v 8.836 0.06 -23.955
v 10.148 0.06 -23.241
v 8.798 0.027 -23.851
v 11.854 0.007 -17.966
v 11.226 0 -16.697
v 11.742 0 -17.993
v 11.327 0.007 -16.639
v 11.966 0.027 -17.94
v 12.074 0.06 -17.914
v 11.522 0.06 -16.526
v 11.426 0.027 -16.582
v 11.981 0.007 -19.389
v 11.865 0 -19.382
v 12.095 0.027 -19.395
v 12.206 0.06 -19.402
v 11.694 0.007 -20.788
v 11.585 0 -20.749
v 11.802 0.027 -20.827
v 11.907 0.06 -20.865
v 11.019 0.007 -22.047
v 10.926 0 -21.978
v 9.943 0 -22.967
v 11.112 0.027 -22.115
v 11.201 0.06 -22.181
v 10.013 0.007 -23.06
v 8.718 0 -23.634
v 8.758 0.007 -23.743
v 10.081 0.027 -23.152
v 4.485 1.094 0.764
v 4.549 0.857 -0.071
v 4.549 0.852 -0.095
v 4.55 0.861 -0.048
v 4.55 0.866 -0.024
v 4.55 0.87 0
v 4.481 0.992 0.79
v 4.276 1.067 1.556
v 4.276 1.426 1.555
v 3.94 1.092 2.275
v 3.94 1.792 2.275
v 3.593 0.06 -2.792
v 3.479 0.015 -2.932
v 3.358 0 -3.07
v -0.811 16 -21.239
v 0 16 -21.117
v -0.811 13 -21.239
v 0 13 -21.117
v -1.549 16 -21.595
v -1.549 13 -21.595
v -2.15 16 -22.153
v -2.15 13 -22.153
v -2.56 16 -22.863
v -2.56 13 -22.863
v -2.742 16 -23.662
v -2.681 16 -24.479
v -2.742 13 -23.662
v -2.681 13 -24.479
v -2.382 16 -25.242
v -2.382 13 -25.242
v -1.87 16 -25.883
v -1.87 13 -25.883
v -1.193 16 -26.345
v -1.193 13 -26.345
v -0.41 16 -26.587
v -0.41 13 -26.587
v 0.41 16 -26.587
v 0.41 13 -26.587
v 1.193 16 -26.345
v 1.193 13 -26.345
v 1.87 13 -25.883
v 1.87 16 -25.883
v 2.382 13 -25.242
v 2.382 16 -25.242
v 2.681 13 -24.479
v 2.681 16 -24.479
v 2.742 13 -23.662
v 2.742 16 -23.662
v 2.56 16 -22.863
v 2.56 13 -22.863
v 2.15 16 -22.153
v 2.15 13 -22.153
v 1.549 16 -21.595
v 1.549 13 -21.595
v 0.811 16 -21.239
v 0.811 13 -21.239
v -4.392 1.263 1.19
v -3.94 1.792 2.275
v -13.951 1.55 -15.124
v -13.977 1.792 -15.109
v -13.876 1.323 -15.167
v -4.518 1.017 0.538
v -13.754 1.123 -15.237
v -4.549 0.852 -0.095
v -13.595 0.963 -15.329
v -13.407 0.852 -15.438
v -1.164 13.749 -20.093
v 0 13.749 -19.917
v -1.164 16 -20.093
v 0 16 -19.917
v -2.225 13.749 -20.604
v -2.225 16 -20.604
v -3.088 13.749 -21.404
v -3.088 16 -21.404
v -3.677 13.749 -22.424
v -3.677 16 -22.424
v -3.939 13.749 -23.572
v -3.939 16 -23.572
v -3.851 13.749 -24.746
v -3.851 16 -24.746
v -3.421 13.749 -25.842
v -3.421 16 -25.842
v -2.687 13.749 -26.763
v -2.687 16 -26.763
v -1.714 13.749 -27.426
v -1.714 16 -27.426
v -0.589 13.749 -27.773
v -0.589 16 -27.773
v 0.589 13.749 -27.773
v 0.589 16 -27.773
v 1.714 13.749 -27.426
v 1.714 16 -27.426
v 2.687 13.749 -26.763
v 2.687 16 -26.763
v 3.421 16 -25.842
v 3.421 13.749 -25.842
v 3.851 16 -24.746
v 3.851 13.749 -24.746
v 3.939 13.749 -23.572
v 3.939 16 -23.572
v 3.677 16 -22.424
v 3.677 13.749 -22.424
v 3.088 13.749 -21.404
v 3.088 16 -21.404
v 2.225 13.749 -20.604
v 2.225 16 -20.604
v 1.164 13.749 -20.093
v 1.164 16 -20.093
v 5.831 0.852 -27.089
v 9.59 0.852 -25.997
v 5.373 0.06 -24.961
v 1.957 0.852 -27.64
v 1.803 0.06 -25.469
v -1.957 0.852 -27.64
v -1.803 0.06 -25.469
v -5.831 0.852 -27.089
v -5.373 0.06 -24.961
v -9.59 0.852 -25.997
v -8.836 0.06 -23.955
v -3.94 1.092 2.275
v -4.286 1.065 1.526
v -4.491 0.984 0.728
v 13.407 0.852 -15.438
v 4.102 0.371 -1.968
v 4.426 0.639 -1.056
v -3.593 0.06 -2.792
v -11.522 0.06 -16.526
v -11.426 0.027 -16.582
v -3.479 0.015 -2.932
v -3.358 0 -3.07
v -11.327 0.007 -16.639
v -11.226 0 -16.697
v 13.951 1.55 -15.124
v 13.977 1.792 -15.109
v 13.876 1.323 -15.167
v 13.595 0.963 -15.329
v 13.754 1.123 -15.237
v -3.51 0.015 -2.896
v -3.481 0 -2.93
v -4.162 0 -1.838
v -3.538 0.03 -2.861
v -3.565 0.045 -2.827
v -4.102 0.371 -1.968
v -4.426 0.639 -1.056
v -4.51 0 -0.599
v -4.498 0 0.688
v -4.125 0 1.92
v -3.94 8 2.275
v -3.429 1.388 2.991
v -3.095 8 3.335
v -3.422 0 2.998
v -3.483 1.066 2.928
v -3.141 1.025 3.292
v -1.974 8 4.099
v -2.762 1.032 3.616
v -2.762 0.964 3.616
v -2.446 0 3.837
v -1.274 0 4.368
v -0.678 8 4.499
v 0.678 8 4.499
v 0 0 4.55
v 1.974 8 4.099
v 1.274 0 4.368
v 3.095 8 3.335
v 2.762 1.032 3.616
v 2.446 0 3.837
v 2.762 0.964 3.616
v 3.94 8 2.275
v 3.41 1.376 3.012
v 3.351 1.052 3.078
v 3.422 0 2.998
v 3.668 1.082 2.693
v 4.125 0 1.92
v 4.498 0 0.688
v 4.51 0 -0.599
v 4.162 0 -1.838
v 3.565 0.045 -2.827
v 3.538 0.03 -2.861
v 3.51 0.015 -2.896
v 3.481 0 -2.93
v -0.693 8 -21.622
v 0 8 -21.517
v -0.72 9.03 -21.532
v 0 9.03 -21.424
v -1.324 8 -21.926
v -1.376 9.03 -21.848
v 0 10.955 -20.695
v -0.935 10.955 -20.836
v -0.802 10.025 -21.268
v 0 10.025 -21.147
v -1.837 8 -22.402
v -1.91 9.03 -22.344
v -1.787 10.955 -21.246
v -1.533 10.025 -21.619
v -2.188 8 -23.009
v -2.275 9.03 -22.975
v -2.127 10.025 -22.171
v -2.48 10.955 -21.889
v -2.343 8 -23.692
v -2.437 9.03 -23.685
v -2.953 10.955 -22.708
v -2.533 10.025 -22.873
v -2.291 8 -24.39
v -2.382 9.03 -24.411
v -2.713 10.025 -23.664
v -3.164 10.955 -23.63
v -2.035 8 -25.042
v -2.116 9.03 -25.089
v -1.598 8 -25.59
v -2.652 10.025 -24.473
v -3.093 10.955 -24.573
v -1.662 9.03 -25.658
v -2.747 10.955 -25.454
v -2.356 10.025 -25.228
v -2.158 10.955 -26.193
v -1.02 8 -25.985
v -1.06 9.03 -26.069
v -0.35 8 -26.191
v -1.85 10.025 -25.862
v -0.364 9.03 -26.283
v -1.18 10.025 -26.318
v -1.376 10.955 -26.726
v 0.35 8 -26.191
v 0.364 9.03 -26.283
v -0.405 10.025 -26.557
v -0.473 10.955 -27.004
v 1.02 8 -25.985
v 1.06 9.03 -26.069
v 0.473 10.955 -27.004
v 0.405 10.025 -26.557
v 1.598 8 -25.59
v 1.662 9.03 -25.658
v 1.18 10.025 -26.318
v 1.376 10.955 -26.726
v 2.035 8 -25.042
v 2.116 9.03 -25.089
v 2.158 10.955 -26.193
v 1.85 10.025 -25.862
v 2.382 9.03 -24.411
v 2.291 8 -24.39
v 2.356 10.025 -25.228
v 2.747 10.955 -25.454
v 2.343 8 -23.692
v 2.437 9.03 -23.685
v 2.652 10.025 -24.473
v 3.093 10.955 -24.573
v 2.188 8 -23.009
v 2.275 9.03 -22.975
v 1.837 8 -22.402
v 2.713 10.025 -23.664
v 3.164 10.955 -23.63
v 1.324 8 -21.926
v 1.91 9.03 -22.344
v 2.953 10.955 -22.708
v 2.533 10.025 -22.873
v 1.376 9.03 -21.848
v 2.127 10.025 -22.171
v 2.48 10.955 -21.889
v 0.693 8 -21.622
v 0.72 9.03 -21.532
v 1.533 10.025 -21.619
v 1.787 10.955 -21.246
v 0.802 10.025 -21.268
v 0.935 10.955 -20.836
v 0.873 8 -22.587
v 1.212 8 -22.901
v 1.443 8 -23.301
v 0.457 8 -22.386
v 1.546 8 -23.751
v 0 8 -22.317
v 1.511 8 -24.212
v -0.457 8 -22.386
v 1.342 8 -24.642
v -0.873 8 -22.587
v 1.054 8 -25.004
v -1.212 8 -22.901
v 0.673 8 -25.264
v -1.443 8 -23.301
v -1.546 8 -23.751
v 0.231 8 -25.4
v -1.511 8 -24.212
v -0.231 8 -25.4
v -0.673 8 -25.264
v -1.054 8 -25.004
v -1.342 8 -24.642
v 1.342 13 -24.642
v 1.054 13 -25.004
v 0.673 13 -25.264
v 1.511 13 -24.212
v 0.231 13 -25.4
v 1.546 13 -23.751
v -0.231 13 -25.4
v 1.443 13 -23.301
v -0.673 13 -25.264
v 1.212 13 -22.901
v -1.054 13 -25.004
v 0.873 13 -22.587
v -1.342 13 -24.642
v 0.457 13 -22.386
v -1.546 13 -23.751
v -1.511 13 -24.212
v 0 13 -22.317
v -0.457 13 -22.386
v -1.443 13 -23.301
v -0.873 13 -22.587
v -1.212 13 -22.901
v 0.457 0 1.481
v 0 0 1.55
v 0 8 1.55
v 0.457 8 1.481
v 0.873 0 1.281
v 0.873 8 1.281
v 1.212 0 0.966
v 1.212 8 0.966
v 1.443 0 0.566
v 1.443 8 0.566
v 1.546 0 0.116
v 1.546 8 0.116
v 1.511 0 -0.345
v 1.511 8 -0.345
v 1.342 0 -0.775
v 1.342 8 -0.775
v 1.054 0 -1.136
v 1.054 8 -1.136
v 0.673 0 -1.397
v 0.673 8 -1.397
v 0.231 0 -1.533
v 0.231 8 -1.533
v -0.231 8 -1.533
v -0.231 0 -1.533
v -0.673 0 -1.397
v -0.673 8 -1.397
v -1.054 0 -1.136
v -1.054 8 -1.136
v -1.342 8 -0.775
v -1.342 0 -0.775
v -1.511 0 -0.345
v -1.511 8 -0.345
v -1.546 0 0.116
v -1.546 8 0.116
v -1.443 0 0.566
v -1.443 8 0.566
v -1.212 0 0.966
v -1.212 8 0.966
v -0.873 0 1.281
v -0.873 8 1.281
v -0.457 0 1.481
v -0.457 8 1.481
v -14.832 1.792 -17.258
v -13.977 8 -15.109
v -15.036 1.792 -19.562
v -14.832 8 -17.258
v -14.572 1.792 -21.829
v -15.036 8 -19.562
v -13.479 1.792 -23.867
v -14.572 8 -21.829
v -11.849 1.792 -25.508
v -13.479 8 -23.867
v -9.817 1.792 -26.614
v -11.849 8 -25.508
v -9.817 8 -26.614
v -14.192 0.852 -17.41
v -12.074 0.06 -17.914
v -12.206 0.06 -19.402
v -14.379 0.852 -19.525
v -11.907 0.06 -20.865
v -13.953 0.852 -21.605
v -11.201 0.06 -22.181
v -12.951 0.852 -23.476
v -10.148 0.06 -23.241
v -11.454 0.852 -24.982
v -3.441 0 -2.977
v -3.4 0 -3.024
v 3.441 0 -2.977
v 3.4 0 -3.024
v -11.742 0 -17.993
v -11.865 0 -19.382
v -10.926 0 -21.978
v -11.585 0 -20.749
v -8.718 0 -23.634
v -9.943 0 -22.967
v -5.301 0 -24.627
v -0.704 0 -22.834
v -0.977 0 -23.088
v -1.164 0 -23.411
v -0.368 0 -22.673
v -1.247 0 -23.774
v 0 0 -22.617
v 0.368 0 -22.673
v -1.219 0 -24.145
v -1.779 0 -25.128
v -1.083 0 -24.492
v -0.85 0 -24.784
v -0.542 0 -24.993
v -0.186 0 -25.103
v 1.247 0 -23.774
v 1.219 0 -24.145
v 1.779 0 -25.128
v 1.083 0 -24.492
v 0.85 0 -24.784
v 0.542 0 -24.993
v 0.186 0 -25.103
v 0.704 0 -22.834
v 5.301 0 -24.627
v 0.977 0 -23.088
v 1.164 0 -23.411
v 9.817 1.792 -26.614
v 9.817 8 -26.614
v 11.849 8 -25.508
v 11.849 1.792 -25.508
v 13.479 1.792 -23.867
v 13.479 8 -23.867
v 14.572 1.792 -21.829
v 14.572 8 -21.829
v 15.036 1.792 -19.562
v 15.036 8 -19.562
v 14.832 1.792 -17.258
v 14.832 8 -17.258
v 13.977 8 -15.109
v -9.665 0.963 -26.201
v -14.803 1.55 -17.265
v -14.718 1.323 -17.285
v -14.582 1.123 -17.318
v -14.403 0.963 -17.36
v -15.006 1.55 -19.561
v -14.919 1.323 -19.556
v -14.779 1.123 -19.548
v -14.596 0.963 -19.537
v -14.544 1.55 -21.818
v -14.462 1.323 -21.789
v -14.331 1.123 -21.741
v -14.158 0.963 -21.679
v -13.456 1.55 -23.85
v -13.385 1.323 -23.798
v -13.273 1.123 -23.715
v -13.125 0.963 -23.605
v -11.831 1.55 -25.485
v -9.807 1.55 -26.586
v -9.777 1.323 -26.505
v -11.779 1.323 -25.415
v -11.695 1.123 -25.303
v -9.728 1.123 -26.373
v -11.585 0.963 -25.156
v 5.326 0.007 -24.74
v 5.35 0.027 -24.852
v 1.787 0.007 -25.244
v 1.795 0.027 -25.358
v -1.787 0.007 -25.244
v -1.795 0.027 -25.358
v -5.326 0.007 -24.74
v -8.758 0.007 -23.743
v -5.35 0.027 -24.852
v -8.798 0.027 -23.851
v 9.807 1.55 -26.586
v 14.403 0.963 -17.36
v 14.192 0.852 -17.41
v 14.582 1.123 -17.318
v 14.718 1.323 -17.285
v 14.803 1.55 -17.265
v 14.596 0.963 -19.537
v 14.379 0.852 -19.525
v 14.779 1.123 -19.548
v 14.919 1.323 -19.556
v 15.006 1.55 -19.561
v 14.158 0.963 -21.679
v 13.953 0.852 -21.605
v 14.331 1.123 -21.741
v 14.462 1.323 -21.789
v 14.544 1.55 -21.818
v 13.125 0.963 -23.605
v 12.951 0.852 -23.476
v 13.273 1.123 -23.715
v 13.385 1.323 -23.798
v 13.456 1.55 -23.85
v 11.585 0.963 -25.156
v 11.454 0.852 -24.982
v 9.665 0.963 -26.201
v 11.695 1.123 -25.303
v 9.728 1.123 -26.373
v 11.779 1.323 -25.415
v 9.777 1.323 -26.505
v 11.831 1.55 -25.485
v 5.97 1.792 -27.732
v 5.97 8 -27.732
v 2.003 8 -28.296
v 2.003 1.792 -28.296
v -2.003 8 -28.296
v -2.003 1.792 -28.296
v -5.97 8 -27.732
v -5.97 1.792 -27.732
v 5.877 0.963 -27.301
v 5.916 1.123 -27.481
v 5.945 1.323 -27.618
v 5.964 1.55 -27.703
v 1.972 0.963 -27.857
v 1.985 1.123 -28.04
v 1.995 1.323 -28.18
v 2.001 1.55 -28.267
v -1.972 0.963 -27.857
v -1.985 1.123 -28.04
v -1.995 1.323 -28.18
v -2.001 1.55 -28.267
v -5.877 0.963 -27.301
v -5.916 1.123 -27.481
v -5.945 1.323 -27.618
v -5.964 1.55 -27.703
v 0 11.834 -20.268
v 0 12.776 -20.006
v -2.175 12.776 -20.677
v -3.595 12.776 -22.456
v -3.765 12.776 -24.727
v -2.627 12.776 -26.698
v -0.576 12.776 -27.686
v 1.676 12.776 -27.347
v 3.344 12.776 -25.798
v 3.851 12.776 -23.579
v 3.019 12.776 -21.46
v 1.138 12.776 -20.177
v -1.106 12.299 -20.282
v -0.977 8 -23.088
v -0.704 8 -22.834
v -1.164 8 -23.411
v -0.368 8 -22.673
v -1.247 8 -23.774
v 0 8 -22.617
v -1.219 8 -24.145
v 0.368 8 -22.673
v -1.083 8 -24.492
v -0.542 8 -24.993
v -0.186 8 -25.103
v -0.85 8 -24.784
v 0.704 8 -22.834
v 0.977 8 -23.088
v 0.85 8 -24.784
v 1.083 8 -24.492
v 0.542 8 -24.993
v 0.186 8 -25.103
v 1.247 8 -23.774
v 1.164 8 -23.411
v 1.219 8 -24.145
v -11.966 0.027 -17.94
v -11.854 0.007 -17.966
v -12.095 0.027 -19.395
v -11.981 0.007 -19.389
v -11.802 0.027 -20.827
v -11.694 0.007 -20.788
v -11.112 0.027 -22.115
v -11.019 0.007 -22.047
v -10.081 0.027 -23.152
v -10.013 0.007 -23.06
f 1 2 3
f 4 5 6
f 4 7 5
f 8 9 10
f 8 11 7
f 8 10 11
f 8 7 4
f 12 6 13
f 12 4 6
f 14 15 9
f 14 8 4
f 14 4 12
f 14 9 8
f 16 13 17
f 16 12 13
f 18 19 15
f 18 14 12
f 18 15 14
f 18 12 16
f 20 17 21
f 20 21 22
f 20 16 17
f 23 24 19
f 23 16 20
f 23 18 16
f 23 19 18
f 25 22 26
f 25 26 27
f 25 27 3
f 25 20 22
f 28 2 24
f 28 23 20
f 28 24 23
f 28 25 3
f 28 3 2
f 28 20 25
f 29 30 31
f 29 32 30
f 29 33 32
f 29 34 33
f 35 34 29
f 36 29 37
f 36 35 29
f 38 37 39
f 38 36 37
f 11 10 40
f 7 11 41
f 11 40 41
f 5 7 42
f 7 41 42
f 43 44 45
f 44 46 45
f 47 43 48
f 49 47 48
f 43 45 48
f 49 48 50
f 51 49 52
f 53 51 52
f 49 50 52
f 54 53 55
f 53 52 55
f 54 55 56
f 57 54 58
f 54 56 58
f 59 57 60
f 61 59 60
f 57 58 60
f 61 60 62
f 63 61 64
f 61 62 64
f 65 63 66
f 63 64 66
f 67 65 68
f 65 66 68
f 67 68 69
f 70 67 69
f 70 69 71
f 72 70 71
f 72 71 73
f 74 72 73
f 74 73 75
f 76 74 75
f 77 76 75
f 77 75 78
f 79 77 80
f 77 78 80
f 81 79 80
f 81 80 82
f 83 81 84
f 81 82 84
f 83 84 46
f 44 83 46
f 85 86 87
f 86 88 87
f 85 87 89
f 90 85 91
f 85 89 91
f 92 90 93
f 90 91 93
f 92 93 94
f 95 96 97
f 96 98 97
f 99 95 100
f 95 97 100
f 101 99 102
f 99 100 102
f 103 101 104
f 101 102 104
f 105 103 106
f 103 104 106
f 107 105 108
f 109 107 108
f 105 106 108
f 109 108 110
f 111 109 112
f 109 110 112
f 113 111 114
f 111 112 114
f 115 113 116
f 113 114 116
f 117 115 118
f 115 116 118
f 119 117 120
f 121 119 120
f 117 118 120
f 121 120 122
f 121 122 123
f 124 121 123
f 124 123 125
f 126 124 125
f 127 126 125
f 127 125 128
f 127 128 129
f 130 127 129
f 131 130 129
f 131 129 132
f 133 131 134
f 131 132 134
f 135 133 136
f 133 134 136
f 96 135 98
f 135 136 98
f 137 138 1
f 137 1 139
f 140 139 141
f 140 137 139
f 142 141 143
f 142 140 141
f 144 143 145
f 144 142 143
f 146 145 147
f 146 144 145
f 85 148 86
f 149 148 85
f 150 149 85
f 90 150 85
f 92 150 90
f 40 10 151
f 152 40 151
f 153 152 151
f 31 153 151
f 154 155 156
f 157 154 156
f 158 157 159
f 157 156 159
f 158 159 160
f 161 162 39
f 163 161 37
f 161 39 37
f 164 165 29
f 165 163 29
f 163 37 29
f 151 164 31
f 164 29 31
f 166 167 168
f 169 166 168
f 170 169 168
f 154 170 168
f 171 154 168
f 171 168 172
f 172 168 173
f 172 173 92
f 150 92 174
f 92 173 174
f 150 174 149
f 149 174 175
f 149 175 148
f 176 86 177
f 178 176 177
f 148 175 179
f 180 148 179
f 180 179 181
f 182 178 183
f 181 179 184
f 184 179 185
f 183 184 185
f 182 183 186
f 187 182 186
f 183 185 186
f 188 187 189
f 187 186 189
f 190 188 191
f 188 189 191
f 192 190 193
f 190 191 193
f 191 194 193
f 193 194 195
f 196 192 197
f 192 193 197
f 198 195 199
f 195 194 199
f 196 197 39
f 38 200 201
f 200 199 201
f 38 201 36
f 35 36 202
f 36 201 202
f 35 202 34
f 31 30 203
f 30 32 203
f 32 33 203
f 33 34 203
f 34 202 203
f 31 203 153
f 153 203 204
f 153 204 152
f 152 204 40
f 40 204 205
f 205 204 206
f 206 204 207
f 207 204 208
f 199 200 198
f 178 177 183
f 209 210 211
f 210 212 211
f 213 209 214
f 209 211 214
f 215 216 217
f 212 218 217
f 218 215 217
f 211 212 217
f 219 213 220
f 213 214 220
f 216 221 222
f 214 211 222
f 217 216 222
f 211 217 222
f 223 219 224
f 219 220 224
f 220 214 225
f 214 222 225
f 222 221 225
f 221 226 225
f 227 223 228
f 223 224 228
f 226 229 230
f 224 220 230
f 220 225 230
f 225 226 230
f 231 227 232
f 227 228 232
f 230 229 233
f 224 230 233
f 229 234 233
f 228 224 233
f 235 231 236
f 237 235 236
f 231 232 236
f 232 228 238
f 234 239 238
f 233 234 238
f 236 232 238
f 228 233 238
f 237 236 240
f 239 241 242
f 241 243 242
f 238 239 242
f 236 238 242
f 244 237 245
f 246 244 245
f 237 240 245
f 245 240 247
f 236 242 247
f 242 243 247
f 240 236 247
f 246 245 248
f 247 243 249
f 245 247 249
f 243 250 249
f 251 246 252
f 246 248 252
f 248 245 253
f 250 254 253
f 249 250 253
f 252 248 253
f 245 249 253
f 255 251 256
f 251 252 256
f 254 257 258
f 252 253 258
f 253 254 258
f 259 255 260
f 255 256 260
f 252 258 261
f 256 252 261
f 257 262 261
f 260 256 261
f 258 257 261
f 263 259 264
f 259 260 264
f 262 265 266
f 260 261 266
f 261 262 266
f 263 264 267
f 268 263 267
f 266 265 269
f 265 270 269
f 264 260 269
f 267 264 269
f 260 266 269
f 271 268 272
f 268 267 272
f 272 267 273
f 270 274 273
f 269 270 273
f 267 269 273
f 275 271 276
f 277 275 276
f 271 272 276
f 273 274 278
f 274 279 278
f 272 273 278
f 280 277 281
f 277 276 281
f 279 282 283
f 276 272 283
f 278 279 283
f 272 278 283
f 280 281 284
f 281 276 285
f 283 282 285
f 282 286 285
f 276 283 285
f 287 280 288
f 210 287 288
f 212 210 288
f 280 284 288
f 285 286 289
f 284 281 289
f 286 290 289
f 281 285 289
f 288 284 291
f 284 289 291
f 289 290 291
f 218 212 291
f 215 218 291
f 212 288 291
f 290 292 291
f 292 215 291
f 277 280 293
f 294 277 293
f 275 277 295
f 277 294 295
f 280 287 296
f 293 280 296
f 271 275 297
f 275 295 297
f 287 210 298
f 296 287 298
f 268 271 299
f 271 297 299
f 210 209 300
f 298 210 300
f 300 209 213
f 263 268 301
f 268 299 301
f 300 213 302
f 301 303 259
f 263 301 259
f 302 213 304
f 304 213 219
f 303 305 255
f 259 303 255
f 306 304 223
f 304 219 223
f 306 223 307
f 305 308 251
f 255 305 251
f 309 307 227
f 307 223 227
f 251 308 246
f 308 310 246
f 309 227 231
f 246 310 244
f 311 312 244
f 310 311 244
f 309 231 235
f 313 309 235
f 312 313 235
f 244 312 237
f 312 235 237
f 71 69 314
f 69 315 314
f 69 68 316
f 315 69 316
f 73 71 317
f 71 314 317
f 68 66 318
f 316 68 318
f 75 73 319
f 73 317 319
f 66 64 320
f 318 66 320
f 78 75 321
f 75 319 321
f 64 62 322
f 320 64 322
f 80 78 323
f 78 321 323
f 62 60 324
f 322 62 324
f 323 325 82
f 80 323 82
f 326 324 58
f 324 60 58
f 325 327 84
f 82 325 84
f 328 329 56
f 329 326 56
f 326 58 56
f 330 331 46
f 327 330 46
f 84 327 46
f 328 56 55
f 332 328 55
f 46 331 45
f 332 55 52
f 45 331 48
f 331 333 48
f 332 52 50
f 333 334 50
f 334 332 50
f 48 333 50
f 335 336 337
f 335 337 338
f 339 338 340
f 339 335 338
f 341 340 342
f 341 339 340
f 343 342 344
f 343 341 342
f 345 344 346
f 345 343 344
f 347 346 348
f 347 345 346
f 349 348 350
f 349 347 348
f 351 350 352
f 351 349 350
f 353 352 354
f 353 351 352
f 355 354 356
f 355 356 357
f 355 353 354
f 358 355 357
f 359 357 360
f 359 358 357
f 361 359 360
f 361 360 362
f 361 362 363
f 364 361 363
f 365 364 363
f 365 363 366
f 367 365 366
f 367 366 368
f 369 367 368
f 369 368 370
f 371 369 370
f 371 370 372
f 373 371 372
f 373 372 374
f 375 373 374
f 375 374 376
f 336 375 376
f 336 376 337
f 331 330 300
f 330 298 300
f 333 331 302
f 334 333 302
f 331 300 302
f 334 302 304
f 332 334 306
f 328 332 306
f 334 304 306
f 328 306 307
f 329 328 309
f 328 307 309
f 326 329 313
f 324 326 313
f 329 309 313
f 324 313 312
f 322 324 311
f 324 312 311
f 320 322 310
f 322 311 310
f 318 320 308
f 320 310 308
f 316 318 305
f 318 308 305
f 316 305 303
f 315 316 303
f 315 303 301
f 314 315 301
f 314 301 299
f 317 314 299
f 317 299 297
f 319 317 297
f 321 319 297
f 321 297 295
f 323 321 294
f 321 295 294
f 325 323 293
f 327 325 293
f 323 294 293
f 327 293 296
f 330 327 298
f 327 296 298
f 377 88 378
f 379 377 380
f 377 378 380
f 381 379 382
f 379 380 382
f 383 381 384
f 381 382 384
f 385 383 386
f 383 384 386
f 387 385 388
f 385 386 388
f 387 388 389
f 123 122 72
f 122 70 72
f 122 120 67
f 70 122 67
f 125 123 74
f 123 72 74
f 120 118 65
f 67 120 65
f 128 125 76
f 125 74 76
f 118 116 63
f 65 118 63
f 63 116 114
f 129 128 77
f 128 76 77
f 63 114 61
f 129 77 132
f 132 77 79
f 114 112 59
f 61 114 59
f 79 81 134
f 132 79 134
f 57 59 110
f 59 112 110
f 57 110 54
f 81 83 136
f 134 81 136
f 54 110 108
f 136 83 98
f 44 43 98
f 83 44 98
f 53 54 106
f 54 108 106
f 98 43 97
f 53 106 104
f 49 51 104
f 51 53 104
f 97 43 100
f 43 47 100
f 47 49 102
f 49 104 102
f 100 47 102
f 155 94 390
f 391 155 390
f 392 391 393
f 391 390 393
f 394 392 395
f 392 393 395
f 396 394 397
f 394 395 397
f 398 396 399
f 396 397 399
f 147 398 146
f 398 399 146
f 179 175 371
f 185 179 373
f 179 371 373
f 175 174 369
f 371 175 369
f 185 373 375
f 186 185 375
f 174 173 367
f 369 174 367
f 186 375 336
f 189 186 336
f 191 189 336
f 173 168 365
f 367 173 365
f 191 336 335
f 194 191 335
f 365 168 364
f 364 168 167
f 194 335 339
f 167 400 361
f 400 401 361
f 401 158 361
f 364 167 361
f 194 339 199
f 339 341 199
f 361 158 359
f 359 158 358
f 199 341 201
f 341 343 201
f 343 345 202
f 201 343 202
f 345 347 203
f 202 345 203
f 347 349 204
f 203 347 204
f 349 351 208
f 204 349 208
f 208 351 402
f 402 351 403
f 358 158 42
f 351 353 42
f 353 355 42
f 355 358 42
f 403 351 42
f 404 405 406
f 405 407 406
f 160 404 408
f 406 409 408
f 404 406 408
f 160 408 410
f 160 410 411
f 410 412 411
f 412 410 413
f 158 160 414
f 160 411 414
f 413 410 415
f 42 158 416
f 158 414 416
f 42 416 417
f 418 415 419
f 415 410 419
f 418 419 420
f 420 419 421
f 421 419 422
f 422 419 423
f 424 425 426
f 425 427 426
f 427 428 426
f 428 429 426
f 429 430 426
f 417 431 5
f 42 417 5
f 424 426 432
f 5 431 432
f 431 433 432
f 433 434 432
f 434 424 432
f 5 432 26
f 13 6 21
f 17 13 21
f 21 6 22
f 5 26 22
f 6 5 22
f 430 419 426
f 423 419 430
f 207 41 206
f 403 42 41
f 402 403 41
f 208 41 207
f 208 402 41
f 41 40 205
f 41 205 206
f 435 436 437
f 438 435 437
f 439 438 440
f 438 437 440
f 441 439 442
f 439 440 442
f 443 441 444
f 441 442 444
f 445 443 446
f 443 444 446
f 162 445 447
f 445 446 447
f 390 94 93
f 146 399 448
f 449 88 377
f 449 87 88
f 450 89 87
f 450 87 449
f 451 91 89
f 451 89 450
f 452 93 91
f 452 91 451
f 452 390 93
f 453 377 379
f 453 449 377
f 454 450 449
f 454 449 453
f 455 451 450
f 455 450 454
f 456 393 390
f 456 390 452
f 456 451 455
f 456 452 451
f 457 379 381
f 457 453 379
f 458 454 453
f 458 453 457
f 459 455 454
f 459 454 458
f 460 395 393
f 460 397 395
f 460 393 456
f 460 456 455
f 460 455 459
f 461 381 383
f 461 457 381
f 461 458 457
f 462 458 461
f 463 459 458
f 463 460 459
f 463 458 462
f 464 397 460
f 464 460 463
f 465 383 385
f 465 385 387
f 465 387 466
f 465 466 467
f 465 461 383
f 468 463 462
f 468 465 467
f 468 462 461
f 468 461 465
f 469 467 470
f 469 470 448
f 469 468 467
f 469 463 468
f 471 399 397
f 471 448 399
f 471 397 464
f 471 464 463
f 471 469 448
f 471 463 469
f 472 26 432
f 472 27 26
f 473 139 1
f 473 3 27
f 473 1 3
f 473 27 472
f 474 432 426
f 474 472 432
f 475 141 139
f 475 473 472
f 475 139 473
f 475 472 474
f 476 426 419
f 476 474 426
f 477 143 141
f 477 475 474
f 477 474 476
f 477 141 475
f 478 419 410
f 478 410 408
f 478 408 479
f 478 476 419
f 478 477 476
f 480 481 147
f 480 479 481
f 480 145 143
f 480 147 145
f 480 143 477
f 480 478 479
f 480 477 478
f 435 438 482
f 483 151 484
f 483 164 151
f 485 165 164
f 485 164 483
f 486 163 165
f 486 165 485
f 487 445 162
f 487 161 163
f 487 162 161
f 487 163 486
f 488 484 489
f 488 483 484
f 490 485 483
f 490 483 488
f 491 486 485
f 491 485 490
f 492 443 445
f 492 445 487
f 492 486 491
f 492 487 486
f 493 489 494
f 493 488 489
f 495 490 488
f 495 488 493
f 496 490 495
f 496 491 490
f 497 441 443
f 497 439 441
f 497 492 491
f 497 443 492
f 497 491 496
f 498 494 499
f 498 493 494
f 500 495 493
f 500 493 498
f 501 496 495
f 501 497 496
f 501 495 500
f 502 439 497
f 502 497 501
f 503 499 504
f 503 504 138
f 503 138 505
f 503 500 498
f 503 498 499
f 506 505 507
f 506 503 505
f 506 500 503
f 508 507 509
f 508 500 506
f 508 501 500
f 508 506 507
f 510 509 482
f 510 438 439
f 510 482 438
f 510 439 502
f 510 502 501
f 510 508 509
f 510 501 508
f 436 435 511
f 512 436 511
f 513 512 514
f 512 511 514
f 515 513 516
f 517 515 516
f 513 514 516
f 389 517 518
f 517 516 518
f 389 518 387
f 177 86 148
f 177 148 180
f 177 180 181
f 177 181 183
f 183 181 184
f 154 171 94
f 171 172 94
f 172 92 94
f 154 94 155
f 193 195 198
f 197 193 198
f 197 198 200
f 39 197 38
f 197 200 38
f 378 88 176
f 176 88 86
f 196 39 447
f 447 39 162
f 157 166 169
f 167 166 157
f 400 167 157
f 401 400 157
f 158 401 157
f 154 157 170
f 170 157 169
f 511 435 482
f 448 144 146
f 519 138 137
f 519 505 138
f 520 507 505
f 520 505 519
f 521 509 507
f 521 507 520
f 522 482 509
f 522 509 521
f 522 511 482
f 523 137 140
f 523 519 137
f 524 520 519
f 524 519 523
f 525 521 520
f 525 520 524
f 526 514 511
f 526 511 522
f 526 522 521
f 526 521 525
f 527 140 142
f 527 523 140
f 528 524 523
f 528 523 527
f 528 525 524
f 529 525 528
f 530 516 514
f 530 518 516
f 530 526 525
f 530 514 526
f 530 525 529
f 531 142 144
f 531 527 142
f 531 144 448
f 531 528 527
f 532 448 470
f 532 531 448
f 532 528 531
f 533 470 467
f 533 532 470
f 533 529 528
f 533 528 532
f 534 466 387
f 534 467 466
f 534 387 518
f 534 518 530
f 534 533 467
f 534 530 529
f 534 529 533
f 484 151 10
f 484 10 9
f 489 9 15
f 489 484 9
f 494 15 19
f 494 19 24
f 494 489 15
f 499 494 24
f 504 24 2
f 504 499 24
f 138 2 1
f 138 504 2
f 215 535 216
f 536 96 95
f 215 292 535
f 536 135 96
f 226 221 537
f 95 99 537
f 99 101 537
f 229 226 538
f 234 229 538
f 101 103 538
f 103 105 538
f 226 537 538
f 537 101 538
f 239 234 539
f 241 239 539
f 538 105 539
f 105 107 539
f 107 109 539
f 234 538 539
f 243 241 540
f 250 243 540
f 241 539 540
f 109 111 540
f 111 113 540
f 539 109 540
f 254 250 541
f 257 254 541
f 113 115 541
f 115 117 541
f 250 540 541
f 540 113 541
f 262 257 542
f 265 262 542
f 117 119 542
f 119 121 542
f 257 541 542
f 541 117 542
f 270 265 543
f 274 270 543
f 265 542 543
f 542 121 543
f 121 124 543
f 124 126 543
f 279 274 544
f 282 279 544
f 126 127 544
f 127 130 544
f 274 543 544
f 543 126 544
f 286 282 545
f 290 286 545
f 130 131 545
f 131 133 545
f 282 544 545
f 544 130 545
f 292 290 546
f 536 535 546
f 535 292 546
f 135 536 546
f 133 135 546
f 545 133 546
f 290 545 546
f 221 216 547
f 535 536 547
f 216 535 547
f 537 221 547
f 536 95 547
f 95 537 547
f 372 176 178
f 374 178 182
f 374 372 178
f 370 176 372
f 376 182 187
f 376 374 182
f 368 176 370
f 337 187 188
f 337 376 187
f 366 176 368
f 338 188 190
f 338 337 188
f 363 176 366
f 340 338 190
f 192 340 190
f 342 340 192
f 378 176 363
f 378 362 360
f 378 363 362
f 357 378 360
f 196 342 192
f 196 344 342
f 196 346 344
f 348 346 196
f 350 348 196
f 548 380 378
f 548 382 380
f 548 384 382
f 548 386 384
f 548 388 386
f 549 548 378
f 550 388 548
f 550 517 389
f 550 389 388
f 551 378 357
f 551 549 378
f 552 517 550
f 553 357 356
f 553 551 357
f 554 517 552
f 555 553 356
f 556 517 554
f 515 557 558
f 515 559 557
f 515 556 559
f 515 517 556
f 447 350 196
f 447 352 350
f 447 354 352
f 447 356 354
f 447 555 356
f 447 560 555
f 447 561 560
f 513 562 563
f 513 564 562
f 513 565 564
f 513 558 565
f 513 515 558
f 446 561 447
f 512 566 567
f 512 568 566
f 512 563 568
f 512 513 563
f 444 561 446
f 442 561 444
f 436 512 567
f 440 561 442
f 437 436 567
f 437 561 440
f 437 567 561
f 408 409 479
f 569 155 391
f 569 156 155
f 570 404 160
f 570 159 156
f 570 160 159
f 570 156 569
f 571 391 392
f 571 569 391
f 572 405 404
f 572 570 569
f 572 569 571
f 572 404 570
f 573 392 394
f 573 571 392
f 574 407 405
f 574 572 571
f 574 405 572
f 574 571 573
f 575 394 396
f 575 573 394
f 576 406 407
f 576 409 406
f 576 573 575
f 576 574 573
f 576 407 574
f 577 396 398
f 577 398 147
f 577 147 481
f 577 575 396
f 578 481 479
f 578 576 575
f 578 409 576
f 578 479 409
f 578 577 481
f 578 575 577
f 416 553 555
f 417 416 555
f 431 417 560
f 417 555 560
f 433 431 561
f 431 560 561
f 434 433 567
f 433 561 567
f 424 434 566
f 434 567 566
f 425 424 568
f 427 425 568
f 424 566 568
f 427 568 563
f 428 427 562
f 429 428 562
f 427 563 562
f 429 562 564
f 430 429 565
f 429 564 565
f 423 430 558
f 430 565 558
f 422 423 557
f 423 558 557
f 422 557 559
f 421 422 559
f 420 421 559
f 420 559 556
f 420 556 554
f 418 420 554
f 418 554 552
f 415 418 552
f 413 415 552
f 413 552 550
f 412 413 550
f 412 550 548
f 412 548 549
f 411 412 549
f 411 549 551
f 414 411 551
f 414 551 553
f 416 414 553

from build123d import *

# Parameters (mm, degrees)
SKETCH1_R           = 1.55
BOSS_EXTRUDE1_DEPTH = 8
FILLET1_R           = 8
CHAMFER1_SIZE       = 1.091910703
CHAMFER1_SIZE_2     = 3
BOSS_EXTRUDE2_START = -8
SKETCH2_R           = 4.55
SKETCH2_R_2         = 1.55
BOSS_EXTRUDE2_DEPTH = 8
FILLET2_R           = 1
SKETCH3_R           = 1.25
CUT_EXTRUDE1_DEPTH  = 34.093285996


with BuildPart() as part:
    # Sketch1 → Boss-Extrude1 (new body)
    with BuildSketch(Plane(origin=(0, 0, 0), x_dir=(1, 0, 0), z_dir=(0, 1, 0))):
        with BuildLine():
            Line((-17.940415587, 21.973711306), (-3.940415587, -2.275))
            ThreePointArc((-3.940415587, -2.275), (0, -4.55), (3.940415587, -2.275))
            Line((3.940415587, -2.275), (17.940415587, 21.973711306))
            ThreePointArc((17.940415587, 21.973711306), (0, 28.367278685), (-17.940415587, 21.973711306))
        make_face()
        with Locations(Location((0, 0, 0), (0, 0, 270))):
            Circle(SKETCH1_R, mode=Mode.SUBTRACT)
    extrude(amount=BOSS_EXTRUDE1_DEPTH)

    # Fillet1
    fillet1_edges = [part.edges().sort_by_distance(p)[0] for p in [
        (17.940415587, 4, -21.973711306),
        (-17.940415587, 4, -21.973711306),
    ]]
    fillet(fillet1_edges, radius=FILLET1_R)

    # Chamfer1
    # the kernel refuses this chamfer: 3, 1.091910703 mm, written as the material it takes off along each edge
    with BuildSketch(Plane(origin=(-13.976893319, 0, -15.10868936), x_dir=(-0.08577193736400629, 0.9950833631817486, 0.04952045112602449), z_dir=(0.49999999999999806, 0, 0.8660254037844399))) as chamfer1_piece_1:
        Polygon((CHAMFER1_SIZE * 0.995083362998, -CHAMFER1_SIZE * 0.0990409022338), (-CHAMFER1_SIZE_2 * 0.099040902252, -CHAMFER1_SIZE_2 * 0.995083363182), (0, 0), align=None)
    extrude(amount=20.072955463, mode=Mode.SUBTRACT)
    with BuildSketch(Plane(origin=(0, 0, 0), x_dir=(0.3460791300418841, 0, -0.9382053270736915), z_dir=(0.9382053270736915, 0, 0.3460791300418841))) as chamfer1_piece_2:
        Polygon((28.367278685 - CHAMFER1_SIZE_2, 0), (28.367278685, CHAMFER1_SIZE), (28.367278685, 0), align=None)
    revolve(axis=Axis((0, 0, 0), (0, 1, 0)), revolution_arc=40.495367591, mode=Mode.SUBTRACT)
    with BuildSketch(Plane(origin=(7.048690089, 0, -19.10868936), x_dir=(0.86602540378444, 0, 0.4999999999999976), z_dir=(-0.4999999999999976, 0, 0.86602540378444))) as chamfer1_piece_3:
        Polygon((8 - CHAMFER1_SIZE_2, 0), (8, CHAMFER1_SIZE), (8, 0), align=None)
    revolve(axis=Axis((7.048690089, 0, -19.10868936), (0, 1, 0)), revolution_arc=99.752316204, mode=Mode.SUBTRACT)
    with BuildSketch(Plane(origin=(-7.048690089, 0, -19.10868936), x_dir=(-0.8660254037844399, 0, 0.499999999999998), z_dir=(0.499999999999998, 0, 0.8660254037844399))) as chamfer1_piece_4:
        Polygon((8 - CHAMFER1_SIZE_2, 0), (8, -CHAMFER1_SIZE), (8, 0), align=None)
    revolve(axis=Axis((-7.048690089, 0, -19.10868936), (0, -1, 0)), revolution_arc=99.752316204, mode=Mode.SUBTRACT)
    with BuildSketch(Plane(origin=(3.940415587, 0, 2.275), x_dir=(-0.8659501345095242, -0.013184058198645904, -0.4999565432638637), z_dir=(0.49999999999999806, 0, -0.8660254037844399))) as chamfer1_piece_5:
        Polygon((CHAMFER1_SIZE_2 * 0.999913086528, CHAMFER1_SIZE_2 * 0.0131840581986), (-CHAMFER1_SIZE * 0.0131840581962, CHAMFER1_SIZE * 0.999913086343), (0, 0), align=None)
    extrude(amount=20.072955463, mode=Mode.SUBTRACT)
    with BuildSketch(Plane(origin=(0, 0, 0), x_dir=(-0.8660254037844397, 0, 0.49999999999999806), z_dir=(-0.49999999999999806, 0, -0.8660254037844397))) as chamfer1_piece_6:
        Polygon((4.55 - CHAMFER1_SIZE_2, 0), (4.55, CHAMFER1_SIZE), (4.55, 0), align=None)
    revolve(axis=Axis((0, 0, 0), (0, 1, 0)), revolution_arc=120, mode=Mode.SUBTRACT)

    # Sketch2 → Boss-Extrude2 (add)
    with BuildSketch(Plane(origin=(0, 8, 0), x_dir=(1, 0, 0), z_dir=(0, 1, 0)).offset(BOSS_EXTRUDE2_START)):
        Circle(SKETCH2_R)
        with Locations(Location((0, 0, 0), (0, 0, 270))):
            Circle(SKETCH2_R_2, mode=Mode.SUBTRACT)
    extrude(amount=BOSS_EXTRUDE2_DEPTH)

    # Fillet2
    # the kernel refuses this fillet: 1 mm, written as the material it takes off along each edge
    with BuildSketch(Plane(origin=(-11.378817108, 0, -16.60868936), x_dir=(0.866025403784329, -5.361374088471519e-13, -0.50000000000019), z_dir=(0.5000000000001901, 0, 0.866025403784329))) as fillet2_piece_1_section:
        with BuildLine():
            CenterArc((FILLET2_R * 0.176326980708, FILLET2_R), FILLET2_R, 250, 20)
            Line((-FILLET2_R * 0.165693162617, FILLET2_R * 0.0603073792139), (0, 0))
            Line((0, 0), (FILLET2_R * 0.176326980708, 0))
        make_face()
    fillet2_piece_1 = extrude(amount=16.235922988, mode=Mode.PRIVATE)
    fillet2_piece_1 = fillet2_piece_1 - Plane(origin=(0, 0.006623758, 0), x_dir=(-0.8660254037844397, 0, 0.49999999999999806), z_dir=(0, -1, 0)) * Cylinder(4.55, 34, mode=Mode.PRIVATE)
    add(fillet2_piece_1, mode=Mode.SUBTRACT)
    with BuildSketch(Plane(origin=(-7.048690089, 0, -19.10868936), x_dir=(-0.8660254037843291, 0, 0.5000000000001897), z_dir=(0.5000000000001897, 0, 0.8660254037843291))) as fillet2_piece_2:
        with BuildLine():
            CenterArc((5 - FILLET2_R * 0.176326980739, -FILLET2_R), FILLET2_R, 69.999999997, 20.000000003)
            Line((5 + FILLET2_R * 0.165693162642, -FILLET2_R * 0.0603073792344), (5, 0))
            Line((5, 0), (5 - FILLET2_R * 0.176326980739, 0))
        make_face()
    revolve(axis=Axis((-7.048690089, 0, -19.10868936), (0, -1, 0)), revolution_arc=99.752316204, mode=Mode.SUBTRACT)
    with BuildSketch(Plane(origin=(0, 0, 0), x_dir=(0.34607913004188606, 0, -0.938205327073691), z_dir=(0.938205327073691, 0, 0.34607913004188606))) as fillet2_piece_3:
        with BuildLine():
            CenterArc((25.367278685 - FILLET2_R * 0.176326980739, FILLET2_R), FILLET2_R, 270, 20.000000003)
            Line((25.367278685 + FILLET2_R * 0.165693162642, FILLET2_R * 0.0603073792344), (25.367278685, 0))
            Line((25.367278685, 0), (25.367278685 - FILLET2_R * 0.176326980739, 0))
        make_face()
    revolve(axis=Axis((0, 0, 0), (0, 1, 0)), revolution_arc=40.495367591, mode=Mode.SUBTRACT)
    with BuildSketch(Plane(origin=(7.048690089, 0, -19.10868936), x_dir=(0.8660254037843291, 0, 0.5000000000001897), z_dir=(-0.5000000000001897, 0, 0.8660254037843291))) as fillet2_piece_4:
        with BuildLine():
            CenterArc((5 - FILLET2_R * 0.176326980739, FILLET2_R), FILLET2_R, 270, 20.000000003)
            Line((5 + FILLET2_R * 0.165693162642, FILLET2_R * 0.0603073792344), (5, 0))
            Line((5, 0), (5 - FILLET2_R * 0.176326980739, 0))
        make_face()
    revolve(axis=Axis((7.048690089, 0, -19.10868936), (0, 1, 0)), revolution_arc=99.752316204, mode=Mode.SUBTRACT)
    with BuildSketch(Plane(origin=(-13.976893319, 1.091910703, -15.10868936), x_dir=(0.8137976813493196, -0.34202014332551345, -0.469846310393161), z_dir=(0.5000000000001901, 0, 0.866025403784329))) as fillet2_piece_5_section:
        with BuildLine():
            CenterArc((FILLET2_R * 0.70020753821, FILLET2_R), FILLET2_R, 200, 70)
            Line((-FILLET2_R * 0.239485082576, FILLET2_R * 0.657979856674), (0, 0))
            Line((0, 0), (FILLET2_R * 0.70020753821, 0))
        make_face()
    fillet2_piece_5 = extrude(amount=21.823474309, mode=Mode.PRIVATE)
    fillet2_piece_5 = fillet2_piece_5 - Plane(origin=(0, 1.202448518, 0), x_dir=(-0.8660254037844397, 0, 0.49999999999999806), z_dir=(0, -1, 0)) * Cylinder(4.55, 47, mode=Mode.PRIVATE)
    add(fillet2_piece_5, mode=Mode.SUBTRACT)
    with BuildSketch(Plane(origin=(-7.048690089, 1.091910703, -19.10868936), x_dir=(-0.8660254037843289, 0, 0.5000000000001901), z_dir=(0.5000000000001901, 0, 0.8660254037843289))) as fillet2_piece_6:
        with BuildLine():
            CenterArc((8 - FILLET2_R, -FILLET2_R * 0.700207538166), FILLET2_R, 0, 69.999999997)
            Line((8, -FILLET2_R * 0.700207538166), (8, 0))
            Line((8, 0), (8 - FILLET2_R * 0.657979856619, FILLET2_R * 0.2394850826))
        make_face()
    revolve(axis=Axis((-7.048690089, 1.091910703, -19.10868936), (0, -1, 0)), revolution_arc=99.752316204, mode=Mode.SUBTRACT)
    with BuildSketch(Plane(origin=(0, 1.091910703, 0), x_dir=(0.34607913004188606, 0, -0.9382053270736909), z_dir=(0.9382053270736909, 0, 0.34607913004188606))) as fillet2_piece_7:
        with BuildLine():
            CenterArc((28.367278685 - FILLET2_R, FILLET2_R * 0.700207538166), FILLET2_R, 290.000000003, 69.999999997)
            Line((28.367278685, FILLET2_R * 0.700207538166), (28.367278685, 0))
            Line((28.367278685, 0), (28.367278685 - FILLET2_R * 0.657979856619, -FILLET2_R * 0.2394850826))
        make_face()
    revolve(axis=Axis((0, 1.091910703, 0), (0, 1, 0)), revolution_arc=40.495367591, mode=Mode.SUBTRACT)
    with BuildSketch(Plane(origin=(7.048690089, 1.091910703, -19.10868936), x_dir=(0.8660254037843289, 0, 0.5000000000001901), z_dir=(-0.5000000000001901, 0, 0.8660254037843289))) as fillet2_piece_8:
        with BuildLine():
            CenterArc((8 - FILLET2_R, FILLET2_R * 0.700207538166), FILLET2_R, 290.000000003, 69.999999997)
            Line((8, FILLET2_R * 0.700207538166), (8, 0))
            Line((8, 0), (8 - FILLET2_R * 0.657979856619, -FILLET2_R * 0.2394850826))
        make_face()
    revolve(axis=Axis((7.048690089, 1.091910703, -19.10868936), (0, 1, 0)), revolution_arc=99.752316204, mode=Mode.SUBTRACT)
    with BuildSketch(Plane(origin=(3.260855614, 0, -2.547967599), x_dir=(-0.8660254037843289, 0, -0.50000000000019), z_dir=(0.5000000000001901, 0, -0.866025403784329))) as fillet2_piece_9_section:
        with BuildLine():
            CenterArc((FILLET2_R * 0.176326980709, FILLET2_R), FILLET2_R, 250, 20)
            Line((-FILLET2_R * 0.165693162617, FILLET2_R * 0.0603073792142), (0, 0))
            Line((0, 0), (FILLET2_R * 0.176326980709, 0))
        make_face()
    fillet2_piece_9 = extrude(amount=16.235922988, mode=Mode.PRIVATE)
    fillet2_piece_9 = fillet2_piece_9 - Plane(origin=(0, 0.006623758, 0), x_dir=(-0.8660254037844397, 0, 0.49999999999999806), z_dir=(0, -1, 0)) * Cylinder(4.55, 34, mode=Mode.PRIVATE)
    add(fillet2_piece_9, mode=Mode.SUBTRACT)
    with BuildSketch(Plane(origin=(3.065156164, 1.091910703, 3.79099379), x_dir=(-0.813797681349209, -0.34202014332586417, -0.46984631039309716), z_dir=(0.5000000000001901, 0, -0.866025403784329))) as fillet2_piece_10_section:
        with BuildLine():
            CenterArc((FILLET2_R * 0.70020753821, FILLET2_R), FILLET2_R, 200, 70)
            Line((-FILLET2_R * 0.239485082576, FILLET2_R * 0.657979856674), (0, 0))
            Line((0, 0), (FILLET2_R * 0.70020753821, 0))
        make_face()
    fillet2_piece_10 = extrude(amount=21.823474309, mode=Mode.PRIVATE)
    fillet2_piece_10 = fillet2_piece_10 - Plane(origin=(0, 1.202094614, 0), x_dir=(-0.8660254037844397, 0, 0.49999999999999806), z_dir=(0, -1, 0)) * Cylinder(4.55, 47, mode=Mode.PRIVATE)
    add(fillet2_piece_10, mode=Mode.SUBTRACT)

    # Sketch3 → Cut-Extrude1 (cut, through all)
    with BuildSketch(Plane(origin=(0, 8, 0), x_dir=(1, 0, 0), z_dir=(0, 1, 0))):
        with Locations(Location((0, 23.867278685, 0), (0, 0, 270))):
            Circle(SKETCH3_R)
    extrude(amount=-CUT_EXTRUDE1_DEPTH, mode=Mode.SUBTRACT)


with BuildPart() as body_2:
    # Sketch4 → Revolve1 (revolve)
    with BuildSketch(Plane(origin=(0, 0, 0), x_dir=(0, 0, -1), z_dir=(1, 0, 0)), mode=Mode.PRIVATE) as revolve1_sk:
        with BuildLine():
            Line((25.417278685, 8), (26.217278685, 8))
            ThreePointArc((26.217278685, 8), (26.426733202, 9.533798037), (27.03975876, 10.955278701))
            ThreePointArc((27.03975876, 10.955278701), (27.619273815, 12.299055375), (27.817278685, 13.749009692))
            Line((27.817278685, 13.749009692), (27.817278685, 16))
            Line((27.817278685, 16), (26.617278685, 16))
            Line((26.617278685, 16), (26.617278685, 13))
            Line((26.617278685, 13), (25.417278685, 13))
            Line((25.417278685, 13), (25.417278685, 8))
        make_face()
    revolve(revolve1_sk.sketch.rotate(Axis((0, 15.487614556, -23.867278685), (0, -1, 0)), 180), axis=Axis((0, 15.487614556, -23.867278685), (0, -1, 0)))


solid = Compound([part.part, body_2.part])
